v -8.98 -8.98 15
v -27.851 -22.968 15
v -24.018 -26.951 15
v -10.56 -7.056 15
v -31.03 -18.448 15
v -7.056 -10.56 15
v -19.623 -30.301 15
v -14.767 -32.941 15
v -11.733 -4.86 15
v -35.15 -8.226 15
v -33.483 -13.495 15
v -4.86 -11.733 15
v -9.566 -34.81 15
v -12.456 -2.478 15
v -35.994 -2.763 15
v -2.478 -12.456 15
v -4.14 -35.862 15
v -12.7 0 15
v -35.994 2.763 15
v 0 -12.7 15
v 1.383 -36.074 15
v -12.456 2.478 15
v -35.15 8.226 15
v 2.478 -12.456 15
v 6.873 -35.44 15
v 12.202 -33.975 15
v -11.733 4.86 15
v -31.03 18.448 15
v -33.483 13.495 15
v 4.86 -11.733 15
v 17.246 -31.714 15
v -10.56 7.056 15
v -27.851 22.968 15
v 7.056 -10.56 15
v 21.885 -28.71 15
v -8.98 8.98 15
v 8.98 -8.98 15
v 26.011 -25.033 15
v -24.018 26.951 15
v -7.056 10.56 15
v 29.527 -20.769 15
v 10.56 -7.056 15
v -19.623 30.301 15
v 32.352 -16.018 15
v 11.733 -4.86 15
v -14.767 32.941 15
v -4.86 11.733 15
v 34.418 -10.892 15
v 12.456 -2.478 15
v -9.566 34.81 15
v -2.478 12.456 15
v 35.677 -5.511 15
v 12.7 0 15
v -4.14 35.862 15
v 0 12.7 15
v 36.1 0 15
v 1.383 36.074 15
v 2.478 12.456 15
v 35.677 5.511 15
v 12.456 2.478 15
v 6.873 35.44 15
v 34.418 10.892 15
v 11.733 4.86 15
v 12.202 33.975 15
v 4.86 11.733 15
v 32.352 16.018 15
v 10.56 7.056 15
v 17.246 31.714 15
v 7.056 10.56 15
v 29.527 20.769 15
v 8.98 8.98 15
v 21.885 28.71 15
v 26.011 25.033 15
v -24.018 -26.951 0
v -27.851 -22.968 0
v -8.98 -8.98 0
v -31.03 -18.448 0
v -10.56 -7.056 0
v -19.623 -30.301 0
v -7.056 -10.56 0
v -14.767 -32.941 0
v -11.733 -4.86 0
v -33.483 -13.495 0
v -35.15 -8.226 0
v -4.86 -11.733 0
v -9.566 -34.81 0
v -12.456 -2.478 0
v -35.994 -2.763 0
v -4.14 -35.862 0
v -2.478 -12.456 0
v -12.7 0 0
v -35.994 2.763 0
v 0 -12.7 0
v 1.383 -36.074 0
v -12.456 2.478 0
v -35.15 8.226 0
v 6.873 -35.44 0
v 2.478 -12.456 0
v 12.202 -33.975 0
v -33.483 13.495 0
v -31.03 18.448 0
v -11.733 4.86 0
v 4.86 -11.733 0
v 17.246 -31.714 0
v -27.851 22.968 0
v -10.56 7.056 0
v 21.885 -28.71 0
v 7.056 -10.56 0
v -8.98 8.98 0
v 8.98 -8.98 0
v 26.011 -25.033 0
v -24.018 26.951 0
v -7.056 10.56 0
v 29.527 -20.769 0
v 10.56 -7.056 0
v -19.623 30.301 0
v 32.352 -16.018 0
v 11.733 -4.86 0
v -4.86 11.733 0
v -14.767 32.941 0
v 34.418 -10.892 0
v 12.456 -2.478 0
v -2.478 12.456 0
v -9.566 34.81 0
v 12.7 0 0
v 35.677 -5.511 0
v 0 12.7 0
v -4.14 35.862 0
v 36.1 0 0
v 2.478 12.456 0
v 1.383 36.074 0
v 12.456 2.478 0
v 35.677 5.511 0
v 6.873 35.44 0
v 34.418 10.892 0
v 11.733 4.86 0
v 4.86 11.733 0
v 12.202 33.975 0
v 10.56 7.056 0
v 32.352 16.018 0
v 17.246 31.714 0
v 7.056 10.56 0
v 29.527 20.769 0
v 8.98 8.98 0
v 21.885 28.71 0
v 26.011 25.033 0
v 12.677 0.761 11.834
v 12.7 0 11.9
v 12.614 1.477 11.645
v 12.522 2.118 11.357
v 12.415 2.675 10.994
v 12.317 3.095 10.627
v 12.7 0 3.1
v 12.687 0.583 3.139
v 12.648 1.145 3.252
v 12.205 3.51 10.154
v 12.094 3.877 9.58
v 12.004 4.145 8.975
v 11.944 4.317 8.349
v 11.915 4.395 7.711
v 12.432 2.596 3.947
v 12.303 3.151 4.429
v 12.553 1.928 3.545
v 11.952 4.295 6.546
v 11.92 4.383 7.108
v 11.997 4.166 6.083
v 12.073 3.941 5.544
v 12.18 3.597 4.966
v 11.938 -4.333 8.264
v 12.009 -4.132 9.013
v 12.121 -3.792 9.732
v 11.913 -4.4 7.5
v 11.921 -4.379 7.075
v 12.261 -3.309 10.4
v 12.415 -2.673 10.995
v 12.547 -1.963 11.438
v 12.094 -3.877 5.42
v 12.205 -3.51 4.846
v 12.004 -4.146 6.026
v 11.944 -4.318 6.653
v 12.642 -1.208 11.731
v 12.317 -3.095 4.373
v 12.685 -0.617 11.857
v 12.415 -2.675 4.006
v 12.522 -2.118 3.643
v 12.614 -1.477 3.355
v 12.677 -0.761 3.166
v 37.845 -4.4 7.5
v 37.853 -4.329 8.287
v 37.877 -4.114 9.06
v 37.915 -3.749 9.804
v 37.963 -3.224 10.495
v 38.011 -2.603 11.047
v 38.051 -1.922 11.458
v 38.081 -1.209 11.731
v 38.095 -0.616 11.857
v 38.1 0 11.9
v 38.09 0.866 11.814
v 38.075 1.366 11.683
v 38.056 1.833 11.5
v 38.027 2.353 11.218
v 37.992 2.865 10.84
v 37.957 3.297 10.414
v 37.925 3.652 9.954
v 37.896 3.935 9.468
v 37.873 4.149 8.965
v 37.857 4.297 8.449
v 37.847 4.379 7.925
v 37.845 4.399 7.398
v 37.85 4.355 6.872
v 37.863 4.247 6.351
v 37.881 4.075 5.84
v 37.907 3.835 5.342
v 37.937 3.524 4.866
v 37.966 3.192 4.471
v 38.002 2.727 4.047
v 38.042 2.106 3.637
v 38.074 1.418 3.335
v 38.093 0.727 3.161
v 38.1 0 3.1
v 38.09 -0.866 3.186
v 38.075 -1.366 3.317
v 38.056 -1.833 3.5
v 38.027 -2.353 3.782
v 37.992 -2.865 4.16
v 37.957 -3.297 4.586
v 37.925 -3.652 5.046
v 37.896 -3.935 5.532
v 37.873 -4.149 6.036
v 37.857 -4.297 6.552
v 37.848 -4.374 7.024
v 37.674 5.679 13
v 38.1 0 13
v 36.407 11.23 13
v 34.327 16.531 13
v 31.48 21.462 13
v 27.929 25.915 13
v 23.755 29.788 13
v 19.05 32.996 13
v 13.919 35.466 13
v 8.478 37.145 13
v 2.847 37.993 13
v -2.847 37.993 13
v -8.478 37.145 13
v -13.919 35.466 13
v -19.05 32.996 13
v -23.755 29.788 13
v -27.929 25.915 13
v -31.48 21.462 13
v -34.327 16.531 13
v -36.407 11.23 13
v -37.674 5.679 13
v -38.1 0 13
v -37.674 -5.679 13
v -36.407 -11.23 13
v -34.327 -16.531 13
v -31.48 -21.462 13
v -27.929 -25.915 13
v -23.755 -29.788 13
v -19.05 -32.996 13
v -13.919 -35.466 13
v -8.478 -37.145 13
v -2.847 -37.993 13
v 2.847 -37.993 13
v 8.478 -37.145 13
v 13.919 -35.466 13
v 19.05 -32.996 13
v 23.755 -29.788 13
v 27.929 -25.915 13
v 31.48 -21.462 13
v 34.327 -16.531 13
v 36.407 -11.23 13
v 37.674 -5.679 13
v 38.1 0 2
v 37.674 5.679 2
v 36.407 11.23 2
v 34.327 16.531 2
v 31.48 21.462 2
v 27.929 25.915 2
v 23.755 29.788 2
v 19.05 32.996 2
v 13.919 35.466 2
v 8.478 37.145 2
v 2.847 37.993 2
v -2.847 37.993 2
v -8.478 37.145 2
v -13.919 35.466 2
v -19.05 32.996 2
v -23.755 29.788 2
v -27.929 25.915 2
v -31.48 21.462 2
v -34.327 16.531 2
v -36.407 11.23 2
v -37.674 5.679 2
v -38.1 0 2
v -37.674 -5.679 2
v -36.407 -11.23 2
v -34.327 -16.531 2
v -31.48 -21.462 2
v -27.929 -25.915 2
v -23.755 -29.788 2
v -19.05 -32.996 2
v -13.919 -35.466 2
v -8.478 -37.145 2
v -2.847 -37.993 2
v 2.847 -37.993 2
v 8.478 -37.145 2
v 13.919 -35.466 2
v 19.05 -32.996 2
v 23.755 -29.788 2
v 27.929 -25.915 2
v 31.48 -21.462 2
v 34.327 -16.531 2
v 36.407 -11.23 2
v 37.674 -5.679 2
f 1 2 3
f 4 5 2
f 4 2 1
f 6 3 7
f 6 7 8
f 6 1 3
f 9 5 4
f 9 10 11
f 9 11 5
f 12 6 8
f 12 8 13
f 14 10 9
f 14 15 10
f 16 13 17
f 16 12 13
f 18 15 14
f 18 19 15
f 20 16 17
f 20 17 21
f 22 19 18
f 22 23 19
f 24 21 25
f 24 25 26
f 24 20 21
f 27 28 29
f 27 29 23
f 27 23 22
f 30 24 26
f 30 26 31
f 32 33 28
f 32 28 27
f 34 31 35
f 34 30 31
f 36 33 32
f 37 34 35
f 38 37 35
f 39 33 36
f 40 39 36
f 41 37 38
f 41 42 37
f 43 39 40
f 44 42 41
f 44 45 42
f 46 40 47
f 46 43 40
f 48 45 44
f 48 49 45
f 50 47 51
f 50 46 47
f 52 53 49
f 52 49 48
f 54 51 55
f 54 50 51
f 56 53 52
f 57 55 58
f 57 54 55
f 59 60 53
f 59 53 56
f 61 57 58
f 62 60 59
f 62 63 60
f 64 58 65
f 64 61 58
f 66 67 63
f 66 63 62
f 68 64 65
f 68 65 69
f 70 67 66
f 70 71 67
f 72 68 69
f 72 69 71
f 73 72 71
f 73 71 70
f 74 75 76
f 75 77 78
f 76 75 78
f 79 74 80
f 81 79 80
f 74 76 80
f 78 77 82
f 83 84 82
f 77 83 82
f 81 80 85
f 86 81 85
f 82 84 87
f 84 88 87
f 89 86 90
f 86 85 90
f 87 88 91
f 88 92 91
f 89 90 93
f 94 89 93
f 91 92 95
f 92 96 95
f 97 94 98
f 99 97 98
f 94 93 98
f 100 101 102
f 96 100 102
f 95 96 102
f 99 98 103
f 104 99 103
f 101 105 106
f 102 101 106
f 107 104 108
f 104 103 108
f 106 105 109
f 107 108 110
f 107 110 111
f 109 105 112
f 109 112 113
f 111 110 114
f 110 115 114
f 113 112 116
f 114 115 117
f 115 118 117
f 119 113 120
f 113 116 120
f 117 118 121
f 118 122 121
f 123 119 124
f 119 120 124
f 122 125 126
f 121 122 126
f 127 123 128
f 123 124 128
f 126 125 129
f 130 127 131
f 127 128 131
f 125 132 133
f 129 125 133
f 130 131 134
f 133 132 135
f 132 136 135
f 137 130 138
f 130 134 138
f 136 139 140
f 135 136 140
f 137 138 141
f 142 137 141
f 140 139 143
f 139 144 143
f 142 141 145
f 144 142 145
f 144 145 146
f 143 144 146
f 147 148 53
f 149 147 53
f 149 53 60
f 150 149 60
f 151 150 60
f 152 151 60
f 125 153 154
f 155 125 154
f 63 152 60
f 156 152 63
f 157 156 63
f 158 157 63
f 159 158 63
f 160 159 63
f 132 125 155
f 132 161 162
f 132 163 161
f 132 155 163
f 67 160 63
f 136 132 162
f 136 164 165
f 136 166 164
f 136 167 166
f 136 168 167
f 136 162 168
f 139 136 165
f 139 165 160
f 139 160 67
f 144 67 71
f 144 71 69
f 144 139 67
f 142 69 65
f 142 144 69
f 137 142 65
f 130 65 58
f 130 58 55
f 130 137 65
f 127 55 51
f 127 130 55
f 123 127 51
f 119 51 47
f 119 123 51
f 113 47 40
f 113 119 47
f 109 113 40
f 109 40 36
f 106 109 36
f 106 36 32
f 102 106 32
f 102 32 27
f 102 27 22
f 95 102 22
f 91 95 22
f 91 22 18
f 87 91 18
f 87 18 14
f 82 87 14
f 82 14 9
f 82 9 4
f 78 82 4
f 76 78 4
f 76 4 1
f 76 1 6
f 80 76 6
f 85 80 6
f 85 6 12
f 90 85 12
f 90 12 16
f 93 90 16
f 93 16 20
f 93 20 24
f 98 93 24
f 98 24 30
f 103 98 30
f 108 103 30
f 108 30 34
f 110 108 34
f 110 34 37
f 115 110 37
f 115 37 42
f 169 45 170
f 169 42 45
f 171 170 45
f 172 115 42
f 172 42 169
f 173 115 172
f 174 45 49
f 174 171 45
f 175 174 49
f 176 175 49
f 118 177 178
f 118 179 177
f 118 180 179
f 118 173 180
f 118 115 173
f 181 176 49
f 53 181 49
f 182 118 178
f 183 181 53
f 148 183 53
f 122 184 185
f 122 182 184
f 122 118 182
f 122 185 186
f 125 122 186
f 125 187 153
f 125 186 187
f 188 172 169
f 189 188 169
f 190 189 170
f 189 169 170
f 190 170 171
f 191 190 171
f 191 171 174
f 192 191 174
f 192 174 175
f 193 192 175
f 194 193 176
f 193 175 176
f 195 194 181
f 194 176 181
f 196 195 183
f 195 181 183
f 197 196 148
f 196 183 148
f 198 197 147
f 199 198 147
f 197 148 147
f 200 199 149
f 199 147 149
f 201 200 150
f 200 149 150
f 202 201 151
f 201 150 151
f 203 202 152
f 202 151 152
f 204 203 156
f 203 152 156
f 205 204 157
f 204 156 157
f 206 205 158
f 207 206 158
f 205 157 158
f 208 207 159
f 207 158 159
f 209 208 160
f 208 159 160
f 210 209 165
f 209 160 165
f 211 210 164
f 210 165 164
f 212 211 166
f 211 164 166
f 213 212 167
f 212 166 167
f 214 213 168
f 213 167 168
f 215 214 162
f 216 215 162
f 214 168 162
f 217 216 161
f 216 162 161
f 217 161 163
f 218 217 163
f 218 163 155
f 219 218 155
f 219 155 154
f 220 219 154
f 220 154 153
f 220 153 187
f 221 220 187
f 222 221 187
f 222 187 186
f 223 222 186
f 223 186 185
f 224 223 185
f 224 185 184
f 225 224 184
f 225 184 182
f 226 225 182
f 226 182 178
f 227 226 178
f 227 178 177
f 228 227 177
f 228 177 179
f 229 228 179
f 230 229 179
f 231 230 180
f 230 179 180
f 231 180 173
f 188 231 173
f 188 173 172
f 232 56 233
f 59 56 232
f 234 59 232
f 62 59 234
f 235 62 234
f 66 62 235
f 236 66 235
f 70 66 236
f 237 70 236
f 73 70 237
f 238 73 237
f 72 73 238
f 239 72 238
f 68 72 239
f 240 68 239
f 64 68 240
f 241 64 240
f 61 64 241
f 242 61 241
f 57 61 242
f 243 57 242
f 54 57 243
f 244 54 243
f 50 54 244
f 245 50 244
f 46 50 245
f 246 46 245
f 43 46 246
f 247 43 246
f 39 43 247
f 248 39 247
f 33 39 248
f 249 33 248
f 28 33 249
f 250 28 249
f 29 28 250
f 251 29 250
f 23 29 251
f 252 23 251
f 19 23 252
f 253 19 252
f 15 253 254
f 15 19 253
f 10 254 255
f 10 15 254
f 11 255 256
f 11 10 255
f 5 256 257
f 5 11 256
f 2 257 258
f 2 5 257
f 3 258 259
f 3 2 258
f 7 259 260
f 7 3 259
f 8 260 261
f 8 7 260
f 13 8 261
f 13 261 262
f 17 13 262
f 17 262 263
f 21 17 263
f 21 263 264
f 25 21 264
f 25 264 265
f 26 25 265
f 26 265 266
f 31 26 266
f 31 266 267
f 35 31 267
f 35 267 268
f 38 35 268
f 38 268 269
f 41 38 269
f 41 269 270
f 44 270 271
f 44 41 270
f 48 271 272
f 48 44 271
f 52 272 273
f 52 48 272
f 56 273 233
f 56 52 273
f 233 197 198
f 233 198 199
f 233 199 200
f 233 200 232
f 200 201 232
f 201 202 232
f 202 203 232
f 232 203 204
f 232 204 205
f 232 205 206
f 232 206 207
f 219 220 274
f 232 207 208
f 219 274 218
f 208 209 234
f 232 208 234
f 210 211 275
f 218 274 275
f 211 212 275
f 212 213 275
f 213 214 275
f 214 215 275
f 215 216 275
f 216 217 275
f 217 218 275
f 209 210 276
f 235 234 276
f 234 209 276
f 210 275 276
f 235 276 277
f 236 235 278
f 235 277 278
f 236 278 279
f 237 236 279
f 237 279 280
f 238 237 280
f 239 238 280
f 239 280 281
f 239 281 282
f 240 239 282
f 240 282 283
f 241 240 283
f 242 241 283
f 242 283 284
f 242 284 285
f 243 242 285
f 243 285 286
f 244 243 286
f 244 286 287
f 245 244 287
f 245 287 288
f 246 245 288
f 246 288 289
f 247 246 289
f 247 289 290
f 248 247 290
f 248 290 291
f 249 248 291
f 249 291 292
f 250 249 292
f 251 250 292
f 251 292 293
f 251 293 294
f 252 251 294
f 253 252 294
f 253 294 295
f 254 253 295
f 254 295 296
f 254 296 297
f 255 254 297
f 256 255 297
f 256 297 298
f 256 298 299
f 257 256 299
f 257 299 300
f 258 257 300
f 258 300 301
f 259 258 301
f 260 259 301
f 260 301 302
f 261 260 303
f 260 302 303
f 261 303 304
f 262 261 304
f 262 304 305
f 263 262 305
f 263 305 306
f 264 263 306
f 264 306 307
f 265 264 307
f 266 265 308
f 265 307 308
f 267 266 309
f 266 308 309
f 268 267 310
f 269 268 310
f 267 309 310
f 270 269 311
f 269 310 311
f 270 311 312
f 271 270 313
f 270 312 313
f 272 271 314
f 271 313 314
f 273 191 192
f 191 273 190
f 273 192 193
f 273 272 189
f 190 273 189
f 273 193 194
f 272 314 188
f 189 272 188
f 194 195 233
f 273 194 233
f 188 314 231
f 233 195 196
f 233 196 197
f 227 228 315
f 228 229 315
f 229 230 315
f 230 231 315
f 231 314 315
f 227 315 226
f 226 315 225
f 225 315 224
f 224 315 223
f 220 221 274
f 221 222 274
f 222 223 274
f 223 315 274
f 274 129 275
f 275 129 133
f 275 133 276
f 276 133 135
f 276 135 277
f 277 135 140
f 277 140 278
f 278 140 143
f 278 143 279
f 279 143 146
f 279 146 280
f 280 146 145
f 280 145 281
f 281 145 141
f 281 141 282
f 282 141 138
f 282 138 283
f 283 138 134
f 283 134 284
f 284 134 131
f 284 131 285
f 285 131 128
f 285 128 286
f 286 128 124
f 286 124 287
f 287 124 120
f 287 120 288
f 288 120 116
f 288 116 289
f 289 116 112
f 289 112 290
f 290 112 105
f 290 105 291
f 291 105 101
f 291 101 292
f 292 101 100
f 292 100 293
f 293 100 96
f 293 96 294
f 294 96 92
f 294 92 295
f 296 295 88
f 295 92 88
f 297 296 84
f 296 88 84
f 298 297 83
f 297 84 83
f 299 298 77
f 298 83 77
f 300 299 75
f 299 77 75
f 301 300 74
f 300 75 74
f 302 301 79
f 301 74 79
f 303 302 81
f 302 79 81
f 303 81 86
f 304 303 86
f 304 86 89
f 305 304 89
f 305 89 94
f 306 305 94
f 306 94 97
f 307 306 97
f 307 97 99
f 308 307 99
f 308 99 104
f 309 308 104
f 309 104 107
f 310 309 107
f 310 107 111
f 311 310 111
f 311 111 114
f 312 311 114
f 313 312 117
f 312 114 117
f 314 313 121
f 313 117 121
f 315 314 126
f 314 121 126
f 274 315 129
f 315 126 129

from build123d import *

# Parameters (mm, degrees)
F0_R     = 38.1
F0_R_2   = 12.7
F1_DEPTH = 15
F2_SIZE  = 2
F5_D     = 8.8
F5_DEPTH = 38.1
F5_TIP   = 2.6437867237


# Not quite as in the source:
# - a length typed as a fraction of an inch, garbled in the dataset ("3 / 203.2 mm" for 3/8 in), is restored


with BuildPart() as f1:
    # F0 (on Top) → F1 (new body)
    with BuildSketch(Plane.XY):
        Circle(F0_R)
        Circle(F0_R_2, mode=Mode.SUBTRACT)
    extrude(amount=F1_DEPTH)

    # F2
    f2_edges = [f1.edges().sort_by_distance(p)[0] for p in [
        (-38.1, 0, 15),
        (-38.1, 0, 0),
    ]]
    chamfer(f2_edges, length=F2_SIZE)

    # F5
    with Locations(Plane.YZ.offset(38.1)):
        with Locations((0, 7.5)):
            Hole(F5_D / 2, depth=F5_DEPTH)
            with Locations((0, 0, -(F5_DEPTH + F5_TIP / 2))):  # 118° drill point
                Cone(0, F5_D / 2, F5_TIP, mode=Mode.SUBTRACT)


solid = f1.part
